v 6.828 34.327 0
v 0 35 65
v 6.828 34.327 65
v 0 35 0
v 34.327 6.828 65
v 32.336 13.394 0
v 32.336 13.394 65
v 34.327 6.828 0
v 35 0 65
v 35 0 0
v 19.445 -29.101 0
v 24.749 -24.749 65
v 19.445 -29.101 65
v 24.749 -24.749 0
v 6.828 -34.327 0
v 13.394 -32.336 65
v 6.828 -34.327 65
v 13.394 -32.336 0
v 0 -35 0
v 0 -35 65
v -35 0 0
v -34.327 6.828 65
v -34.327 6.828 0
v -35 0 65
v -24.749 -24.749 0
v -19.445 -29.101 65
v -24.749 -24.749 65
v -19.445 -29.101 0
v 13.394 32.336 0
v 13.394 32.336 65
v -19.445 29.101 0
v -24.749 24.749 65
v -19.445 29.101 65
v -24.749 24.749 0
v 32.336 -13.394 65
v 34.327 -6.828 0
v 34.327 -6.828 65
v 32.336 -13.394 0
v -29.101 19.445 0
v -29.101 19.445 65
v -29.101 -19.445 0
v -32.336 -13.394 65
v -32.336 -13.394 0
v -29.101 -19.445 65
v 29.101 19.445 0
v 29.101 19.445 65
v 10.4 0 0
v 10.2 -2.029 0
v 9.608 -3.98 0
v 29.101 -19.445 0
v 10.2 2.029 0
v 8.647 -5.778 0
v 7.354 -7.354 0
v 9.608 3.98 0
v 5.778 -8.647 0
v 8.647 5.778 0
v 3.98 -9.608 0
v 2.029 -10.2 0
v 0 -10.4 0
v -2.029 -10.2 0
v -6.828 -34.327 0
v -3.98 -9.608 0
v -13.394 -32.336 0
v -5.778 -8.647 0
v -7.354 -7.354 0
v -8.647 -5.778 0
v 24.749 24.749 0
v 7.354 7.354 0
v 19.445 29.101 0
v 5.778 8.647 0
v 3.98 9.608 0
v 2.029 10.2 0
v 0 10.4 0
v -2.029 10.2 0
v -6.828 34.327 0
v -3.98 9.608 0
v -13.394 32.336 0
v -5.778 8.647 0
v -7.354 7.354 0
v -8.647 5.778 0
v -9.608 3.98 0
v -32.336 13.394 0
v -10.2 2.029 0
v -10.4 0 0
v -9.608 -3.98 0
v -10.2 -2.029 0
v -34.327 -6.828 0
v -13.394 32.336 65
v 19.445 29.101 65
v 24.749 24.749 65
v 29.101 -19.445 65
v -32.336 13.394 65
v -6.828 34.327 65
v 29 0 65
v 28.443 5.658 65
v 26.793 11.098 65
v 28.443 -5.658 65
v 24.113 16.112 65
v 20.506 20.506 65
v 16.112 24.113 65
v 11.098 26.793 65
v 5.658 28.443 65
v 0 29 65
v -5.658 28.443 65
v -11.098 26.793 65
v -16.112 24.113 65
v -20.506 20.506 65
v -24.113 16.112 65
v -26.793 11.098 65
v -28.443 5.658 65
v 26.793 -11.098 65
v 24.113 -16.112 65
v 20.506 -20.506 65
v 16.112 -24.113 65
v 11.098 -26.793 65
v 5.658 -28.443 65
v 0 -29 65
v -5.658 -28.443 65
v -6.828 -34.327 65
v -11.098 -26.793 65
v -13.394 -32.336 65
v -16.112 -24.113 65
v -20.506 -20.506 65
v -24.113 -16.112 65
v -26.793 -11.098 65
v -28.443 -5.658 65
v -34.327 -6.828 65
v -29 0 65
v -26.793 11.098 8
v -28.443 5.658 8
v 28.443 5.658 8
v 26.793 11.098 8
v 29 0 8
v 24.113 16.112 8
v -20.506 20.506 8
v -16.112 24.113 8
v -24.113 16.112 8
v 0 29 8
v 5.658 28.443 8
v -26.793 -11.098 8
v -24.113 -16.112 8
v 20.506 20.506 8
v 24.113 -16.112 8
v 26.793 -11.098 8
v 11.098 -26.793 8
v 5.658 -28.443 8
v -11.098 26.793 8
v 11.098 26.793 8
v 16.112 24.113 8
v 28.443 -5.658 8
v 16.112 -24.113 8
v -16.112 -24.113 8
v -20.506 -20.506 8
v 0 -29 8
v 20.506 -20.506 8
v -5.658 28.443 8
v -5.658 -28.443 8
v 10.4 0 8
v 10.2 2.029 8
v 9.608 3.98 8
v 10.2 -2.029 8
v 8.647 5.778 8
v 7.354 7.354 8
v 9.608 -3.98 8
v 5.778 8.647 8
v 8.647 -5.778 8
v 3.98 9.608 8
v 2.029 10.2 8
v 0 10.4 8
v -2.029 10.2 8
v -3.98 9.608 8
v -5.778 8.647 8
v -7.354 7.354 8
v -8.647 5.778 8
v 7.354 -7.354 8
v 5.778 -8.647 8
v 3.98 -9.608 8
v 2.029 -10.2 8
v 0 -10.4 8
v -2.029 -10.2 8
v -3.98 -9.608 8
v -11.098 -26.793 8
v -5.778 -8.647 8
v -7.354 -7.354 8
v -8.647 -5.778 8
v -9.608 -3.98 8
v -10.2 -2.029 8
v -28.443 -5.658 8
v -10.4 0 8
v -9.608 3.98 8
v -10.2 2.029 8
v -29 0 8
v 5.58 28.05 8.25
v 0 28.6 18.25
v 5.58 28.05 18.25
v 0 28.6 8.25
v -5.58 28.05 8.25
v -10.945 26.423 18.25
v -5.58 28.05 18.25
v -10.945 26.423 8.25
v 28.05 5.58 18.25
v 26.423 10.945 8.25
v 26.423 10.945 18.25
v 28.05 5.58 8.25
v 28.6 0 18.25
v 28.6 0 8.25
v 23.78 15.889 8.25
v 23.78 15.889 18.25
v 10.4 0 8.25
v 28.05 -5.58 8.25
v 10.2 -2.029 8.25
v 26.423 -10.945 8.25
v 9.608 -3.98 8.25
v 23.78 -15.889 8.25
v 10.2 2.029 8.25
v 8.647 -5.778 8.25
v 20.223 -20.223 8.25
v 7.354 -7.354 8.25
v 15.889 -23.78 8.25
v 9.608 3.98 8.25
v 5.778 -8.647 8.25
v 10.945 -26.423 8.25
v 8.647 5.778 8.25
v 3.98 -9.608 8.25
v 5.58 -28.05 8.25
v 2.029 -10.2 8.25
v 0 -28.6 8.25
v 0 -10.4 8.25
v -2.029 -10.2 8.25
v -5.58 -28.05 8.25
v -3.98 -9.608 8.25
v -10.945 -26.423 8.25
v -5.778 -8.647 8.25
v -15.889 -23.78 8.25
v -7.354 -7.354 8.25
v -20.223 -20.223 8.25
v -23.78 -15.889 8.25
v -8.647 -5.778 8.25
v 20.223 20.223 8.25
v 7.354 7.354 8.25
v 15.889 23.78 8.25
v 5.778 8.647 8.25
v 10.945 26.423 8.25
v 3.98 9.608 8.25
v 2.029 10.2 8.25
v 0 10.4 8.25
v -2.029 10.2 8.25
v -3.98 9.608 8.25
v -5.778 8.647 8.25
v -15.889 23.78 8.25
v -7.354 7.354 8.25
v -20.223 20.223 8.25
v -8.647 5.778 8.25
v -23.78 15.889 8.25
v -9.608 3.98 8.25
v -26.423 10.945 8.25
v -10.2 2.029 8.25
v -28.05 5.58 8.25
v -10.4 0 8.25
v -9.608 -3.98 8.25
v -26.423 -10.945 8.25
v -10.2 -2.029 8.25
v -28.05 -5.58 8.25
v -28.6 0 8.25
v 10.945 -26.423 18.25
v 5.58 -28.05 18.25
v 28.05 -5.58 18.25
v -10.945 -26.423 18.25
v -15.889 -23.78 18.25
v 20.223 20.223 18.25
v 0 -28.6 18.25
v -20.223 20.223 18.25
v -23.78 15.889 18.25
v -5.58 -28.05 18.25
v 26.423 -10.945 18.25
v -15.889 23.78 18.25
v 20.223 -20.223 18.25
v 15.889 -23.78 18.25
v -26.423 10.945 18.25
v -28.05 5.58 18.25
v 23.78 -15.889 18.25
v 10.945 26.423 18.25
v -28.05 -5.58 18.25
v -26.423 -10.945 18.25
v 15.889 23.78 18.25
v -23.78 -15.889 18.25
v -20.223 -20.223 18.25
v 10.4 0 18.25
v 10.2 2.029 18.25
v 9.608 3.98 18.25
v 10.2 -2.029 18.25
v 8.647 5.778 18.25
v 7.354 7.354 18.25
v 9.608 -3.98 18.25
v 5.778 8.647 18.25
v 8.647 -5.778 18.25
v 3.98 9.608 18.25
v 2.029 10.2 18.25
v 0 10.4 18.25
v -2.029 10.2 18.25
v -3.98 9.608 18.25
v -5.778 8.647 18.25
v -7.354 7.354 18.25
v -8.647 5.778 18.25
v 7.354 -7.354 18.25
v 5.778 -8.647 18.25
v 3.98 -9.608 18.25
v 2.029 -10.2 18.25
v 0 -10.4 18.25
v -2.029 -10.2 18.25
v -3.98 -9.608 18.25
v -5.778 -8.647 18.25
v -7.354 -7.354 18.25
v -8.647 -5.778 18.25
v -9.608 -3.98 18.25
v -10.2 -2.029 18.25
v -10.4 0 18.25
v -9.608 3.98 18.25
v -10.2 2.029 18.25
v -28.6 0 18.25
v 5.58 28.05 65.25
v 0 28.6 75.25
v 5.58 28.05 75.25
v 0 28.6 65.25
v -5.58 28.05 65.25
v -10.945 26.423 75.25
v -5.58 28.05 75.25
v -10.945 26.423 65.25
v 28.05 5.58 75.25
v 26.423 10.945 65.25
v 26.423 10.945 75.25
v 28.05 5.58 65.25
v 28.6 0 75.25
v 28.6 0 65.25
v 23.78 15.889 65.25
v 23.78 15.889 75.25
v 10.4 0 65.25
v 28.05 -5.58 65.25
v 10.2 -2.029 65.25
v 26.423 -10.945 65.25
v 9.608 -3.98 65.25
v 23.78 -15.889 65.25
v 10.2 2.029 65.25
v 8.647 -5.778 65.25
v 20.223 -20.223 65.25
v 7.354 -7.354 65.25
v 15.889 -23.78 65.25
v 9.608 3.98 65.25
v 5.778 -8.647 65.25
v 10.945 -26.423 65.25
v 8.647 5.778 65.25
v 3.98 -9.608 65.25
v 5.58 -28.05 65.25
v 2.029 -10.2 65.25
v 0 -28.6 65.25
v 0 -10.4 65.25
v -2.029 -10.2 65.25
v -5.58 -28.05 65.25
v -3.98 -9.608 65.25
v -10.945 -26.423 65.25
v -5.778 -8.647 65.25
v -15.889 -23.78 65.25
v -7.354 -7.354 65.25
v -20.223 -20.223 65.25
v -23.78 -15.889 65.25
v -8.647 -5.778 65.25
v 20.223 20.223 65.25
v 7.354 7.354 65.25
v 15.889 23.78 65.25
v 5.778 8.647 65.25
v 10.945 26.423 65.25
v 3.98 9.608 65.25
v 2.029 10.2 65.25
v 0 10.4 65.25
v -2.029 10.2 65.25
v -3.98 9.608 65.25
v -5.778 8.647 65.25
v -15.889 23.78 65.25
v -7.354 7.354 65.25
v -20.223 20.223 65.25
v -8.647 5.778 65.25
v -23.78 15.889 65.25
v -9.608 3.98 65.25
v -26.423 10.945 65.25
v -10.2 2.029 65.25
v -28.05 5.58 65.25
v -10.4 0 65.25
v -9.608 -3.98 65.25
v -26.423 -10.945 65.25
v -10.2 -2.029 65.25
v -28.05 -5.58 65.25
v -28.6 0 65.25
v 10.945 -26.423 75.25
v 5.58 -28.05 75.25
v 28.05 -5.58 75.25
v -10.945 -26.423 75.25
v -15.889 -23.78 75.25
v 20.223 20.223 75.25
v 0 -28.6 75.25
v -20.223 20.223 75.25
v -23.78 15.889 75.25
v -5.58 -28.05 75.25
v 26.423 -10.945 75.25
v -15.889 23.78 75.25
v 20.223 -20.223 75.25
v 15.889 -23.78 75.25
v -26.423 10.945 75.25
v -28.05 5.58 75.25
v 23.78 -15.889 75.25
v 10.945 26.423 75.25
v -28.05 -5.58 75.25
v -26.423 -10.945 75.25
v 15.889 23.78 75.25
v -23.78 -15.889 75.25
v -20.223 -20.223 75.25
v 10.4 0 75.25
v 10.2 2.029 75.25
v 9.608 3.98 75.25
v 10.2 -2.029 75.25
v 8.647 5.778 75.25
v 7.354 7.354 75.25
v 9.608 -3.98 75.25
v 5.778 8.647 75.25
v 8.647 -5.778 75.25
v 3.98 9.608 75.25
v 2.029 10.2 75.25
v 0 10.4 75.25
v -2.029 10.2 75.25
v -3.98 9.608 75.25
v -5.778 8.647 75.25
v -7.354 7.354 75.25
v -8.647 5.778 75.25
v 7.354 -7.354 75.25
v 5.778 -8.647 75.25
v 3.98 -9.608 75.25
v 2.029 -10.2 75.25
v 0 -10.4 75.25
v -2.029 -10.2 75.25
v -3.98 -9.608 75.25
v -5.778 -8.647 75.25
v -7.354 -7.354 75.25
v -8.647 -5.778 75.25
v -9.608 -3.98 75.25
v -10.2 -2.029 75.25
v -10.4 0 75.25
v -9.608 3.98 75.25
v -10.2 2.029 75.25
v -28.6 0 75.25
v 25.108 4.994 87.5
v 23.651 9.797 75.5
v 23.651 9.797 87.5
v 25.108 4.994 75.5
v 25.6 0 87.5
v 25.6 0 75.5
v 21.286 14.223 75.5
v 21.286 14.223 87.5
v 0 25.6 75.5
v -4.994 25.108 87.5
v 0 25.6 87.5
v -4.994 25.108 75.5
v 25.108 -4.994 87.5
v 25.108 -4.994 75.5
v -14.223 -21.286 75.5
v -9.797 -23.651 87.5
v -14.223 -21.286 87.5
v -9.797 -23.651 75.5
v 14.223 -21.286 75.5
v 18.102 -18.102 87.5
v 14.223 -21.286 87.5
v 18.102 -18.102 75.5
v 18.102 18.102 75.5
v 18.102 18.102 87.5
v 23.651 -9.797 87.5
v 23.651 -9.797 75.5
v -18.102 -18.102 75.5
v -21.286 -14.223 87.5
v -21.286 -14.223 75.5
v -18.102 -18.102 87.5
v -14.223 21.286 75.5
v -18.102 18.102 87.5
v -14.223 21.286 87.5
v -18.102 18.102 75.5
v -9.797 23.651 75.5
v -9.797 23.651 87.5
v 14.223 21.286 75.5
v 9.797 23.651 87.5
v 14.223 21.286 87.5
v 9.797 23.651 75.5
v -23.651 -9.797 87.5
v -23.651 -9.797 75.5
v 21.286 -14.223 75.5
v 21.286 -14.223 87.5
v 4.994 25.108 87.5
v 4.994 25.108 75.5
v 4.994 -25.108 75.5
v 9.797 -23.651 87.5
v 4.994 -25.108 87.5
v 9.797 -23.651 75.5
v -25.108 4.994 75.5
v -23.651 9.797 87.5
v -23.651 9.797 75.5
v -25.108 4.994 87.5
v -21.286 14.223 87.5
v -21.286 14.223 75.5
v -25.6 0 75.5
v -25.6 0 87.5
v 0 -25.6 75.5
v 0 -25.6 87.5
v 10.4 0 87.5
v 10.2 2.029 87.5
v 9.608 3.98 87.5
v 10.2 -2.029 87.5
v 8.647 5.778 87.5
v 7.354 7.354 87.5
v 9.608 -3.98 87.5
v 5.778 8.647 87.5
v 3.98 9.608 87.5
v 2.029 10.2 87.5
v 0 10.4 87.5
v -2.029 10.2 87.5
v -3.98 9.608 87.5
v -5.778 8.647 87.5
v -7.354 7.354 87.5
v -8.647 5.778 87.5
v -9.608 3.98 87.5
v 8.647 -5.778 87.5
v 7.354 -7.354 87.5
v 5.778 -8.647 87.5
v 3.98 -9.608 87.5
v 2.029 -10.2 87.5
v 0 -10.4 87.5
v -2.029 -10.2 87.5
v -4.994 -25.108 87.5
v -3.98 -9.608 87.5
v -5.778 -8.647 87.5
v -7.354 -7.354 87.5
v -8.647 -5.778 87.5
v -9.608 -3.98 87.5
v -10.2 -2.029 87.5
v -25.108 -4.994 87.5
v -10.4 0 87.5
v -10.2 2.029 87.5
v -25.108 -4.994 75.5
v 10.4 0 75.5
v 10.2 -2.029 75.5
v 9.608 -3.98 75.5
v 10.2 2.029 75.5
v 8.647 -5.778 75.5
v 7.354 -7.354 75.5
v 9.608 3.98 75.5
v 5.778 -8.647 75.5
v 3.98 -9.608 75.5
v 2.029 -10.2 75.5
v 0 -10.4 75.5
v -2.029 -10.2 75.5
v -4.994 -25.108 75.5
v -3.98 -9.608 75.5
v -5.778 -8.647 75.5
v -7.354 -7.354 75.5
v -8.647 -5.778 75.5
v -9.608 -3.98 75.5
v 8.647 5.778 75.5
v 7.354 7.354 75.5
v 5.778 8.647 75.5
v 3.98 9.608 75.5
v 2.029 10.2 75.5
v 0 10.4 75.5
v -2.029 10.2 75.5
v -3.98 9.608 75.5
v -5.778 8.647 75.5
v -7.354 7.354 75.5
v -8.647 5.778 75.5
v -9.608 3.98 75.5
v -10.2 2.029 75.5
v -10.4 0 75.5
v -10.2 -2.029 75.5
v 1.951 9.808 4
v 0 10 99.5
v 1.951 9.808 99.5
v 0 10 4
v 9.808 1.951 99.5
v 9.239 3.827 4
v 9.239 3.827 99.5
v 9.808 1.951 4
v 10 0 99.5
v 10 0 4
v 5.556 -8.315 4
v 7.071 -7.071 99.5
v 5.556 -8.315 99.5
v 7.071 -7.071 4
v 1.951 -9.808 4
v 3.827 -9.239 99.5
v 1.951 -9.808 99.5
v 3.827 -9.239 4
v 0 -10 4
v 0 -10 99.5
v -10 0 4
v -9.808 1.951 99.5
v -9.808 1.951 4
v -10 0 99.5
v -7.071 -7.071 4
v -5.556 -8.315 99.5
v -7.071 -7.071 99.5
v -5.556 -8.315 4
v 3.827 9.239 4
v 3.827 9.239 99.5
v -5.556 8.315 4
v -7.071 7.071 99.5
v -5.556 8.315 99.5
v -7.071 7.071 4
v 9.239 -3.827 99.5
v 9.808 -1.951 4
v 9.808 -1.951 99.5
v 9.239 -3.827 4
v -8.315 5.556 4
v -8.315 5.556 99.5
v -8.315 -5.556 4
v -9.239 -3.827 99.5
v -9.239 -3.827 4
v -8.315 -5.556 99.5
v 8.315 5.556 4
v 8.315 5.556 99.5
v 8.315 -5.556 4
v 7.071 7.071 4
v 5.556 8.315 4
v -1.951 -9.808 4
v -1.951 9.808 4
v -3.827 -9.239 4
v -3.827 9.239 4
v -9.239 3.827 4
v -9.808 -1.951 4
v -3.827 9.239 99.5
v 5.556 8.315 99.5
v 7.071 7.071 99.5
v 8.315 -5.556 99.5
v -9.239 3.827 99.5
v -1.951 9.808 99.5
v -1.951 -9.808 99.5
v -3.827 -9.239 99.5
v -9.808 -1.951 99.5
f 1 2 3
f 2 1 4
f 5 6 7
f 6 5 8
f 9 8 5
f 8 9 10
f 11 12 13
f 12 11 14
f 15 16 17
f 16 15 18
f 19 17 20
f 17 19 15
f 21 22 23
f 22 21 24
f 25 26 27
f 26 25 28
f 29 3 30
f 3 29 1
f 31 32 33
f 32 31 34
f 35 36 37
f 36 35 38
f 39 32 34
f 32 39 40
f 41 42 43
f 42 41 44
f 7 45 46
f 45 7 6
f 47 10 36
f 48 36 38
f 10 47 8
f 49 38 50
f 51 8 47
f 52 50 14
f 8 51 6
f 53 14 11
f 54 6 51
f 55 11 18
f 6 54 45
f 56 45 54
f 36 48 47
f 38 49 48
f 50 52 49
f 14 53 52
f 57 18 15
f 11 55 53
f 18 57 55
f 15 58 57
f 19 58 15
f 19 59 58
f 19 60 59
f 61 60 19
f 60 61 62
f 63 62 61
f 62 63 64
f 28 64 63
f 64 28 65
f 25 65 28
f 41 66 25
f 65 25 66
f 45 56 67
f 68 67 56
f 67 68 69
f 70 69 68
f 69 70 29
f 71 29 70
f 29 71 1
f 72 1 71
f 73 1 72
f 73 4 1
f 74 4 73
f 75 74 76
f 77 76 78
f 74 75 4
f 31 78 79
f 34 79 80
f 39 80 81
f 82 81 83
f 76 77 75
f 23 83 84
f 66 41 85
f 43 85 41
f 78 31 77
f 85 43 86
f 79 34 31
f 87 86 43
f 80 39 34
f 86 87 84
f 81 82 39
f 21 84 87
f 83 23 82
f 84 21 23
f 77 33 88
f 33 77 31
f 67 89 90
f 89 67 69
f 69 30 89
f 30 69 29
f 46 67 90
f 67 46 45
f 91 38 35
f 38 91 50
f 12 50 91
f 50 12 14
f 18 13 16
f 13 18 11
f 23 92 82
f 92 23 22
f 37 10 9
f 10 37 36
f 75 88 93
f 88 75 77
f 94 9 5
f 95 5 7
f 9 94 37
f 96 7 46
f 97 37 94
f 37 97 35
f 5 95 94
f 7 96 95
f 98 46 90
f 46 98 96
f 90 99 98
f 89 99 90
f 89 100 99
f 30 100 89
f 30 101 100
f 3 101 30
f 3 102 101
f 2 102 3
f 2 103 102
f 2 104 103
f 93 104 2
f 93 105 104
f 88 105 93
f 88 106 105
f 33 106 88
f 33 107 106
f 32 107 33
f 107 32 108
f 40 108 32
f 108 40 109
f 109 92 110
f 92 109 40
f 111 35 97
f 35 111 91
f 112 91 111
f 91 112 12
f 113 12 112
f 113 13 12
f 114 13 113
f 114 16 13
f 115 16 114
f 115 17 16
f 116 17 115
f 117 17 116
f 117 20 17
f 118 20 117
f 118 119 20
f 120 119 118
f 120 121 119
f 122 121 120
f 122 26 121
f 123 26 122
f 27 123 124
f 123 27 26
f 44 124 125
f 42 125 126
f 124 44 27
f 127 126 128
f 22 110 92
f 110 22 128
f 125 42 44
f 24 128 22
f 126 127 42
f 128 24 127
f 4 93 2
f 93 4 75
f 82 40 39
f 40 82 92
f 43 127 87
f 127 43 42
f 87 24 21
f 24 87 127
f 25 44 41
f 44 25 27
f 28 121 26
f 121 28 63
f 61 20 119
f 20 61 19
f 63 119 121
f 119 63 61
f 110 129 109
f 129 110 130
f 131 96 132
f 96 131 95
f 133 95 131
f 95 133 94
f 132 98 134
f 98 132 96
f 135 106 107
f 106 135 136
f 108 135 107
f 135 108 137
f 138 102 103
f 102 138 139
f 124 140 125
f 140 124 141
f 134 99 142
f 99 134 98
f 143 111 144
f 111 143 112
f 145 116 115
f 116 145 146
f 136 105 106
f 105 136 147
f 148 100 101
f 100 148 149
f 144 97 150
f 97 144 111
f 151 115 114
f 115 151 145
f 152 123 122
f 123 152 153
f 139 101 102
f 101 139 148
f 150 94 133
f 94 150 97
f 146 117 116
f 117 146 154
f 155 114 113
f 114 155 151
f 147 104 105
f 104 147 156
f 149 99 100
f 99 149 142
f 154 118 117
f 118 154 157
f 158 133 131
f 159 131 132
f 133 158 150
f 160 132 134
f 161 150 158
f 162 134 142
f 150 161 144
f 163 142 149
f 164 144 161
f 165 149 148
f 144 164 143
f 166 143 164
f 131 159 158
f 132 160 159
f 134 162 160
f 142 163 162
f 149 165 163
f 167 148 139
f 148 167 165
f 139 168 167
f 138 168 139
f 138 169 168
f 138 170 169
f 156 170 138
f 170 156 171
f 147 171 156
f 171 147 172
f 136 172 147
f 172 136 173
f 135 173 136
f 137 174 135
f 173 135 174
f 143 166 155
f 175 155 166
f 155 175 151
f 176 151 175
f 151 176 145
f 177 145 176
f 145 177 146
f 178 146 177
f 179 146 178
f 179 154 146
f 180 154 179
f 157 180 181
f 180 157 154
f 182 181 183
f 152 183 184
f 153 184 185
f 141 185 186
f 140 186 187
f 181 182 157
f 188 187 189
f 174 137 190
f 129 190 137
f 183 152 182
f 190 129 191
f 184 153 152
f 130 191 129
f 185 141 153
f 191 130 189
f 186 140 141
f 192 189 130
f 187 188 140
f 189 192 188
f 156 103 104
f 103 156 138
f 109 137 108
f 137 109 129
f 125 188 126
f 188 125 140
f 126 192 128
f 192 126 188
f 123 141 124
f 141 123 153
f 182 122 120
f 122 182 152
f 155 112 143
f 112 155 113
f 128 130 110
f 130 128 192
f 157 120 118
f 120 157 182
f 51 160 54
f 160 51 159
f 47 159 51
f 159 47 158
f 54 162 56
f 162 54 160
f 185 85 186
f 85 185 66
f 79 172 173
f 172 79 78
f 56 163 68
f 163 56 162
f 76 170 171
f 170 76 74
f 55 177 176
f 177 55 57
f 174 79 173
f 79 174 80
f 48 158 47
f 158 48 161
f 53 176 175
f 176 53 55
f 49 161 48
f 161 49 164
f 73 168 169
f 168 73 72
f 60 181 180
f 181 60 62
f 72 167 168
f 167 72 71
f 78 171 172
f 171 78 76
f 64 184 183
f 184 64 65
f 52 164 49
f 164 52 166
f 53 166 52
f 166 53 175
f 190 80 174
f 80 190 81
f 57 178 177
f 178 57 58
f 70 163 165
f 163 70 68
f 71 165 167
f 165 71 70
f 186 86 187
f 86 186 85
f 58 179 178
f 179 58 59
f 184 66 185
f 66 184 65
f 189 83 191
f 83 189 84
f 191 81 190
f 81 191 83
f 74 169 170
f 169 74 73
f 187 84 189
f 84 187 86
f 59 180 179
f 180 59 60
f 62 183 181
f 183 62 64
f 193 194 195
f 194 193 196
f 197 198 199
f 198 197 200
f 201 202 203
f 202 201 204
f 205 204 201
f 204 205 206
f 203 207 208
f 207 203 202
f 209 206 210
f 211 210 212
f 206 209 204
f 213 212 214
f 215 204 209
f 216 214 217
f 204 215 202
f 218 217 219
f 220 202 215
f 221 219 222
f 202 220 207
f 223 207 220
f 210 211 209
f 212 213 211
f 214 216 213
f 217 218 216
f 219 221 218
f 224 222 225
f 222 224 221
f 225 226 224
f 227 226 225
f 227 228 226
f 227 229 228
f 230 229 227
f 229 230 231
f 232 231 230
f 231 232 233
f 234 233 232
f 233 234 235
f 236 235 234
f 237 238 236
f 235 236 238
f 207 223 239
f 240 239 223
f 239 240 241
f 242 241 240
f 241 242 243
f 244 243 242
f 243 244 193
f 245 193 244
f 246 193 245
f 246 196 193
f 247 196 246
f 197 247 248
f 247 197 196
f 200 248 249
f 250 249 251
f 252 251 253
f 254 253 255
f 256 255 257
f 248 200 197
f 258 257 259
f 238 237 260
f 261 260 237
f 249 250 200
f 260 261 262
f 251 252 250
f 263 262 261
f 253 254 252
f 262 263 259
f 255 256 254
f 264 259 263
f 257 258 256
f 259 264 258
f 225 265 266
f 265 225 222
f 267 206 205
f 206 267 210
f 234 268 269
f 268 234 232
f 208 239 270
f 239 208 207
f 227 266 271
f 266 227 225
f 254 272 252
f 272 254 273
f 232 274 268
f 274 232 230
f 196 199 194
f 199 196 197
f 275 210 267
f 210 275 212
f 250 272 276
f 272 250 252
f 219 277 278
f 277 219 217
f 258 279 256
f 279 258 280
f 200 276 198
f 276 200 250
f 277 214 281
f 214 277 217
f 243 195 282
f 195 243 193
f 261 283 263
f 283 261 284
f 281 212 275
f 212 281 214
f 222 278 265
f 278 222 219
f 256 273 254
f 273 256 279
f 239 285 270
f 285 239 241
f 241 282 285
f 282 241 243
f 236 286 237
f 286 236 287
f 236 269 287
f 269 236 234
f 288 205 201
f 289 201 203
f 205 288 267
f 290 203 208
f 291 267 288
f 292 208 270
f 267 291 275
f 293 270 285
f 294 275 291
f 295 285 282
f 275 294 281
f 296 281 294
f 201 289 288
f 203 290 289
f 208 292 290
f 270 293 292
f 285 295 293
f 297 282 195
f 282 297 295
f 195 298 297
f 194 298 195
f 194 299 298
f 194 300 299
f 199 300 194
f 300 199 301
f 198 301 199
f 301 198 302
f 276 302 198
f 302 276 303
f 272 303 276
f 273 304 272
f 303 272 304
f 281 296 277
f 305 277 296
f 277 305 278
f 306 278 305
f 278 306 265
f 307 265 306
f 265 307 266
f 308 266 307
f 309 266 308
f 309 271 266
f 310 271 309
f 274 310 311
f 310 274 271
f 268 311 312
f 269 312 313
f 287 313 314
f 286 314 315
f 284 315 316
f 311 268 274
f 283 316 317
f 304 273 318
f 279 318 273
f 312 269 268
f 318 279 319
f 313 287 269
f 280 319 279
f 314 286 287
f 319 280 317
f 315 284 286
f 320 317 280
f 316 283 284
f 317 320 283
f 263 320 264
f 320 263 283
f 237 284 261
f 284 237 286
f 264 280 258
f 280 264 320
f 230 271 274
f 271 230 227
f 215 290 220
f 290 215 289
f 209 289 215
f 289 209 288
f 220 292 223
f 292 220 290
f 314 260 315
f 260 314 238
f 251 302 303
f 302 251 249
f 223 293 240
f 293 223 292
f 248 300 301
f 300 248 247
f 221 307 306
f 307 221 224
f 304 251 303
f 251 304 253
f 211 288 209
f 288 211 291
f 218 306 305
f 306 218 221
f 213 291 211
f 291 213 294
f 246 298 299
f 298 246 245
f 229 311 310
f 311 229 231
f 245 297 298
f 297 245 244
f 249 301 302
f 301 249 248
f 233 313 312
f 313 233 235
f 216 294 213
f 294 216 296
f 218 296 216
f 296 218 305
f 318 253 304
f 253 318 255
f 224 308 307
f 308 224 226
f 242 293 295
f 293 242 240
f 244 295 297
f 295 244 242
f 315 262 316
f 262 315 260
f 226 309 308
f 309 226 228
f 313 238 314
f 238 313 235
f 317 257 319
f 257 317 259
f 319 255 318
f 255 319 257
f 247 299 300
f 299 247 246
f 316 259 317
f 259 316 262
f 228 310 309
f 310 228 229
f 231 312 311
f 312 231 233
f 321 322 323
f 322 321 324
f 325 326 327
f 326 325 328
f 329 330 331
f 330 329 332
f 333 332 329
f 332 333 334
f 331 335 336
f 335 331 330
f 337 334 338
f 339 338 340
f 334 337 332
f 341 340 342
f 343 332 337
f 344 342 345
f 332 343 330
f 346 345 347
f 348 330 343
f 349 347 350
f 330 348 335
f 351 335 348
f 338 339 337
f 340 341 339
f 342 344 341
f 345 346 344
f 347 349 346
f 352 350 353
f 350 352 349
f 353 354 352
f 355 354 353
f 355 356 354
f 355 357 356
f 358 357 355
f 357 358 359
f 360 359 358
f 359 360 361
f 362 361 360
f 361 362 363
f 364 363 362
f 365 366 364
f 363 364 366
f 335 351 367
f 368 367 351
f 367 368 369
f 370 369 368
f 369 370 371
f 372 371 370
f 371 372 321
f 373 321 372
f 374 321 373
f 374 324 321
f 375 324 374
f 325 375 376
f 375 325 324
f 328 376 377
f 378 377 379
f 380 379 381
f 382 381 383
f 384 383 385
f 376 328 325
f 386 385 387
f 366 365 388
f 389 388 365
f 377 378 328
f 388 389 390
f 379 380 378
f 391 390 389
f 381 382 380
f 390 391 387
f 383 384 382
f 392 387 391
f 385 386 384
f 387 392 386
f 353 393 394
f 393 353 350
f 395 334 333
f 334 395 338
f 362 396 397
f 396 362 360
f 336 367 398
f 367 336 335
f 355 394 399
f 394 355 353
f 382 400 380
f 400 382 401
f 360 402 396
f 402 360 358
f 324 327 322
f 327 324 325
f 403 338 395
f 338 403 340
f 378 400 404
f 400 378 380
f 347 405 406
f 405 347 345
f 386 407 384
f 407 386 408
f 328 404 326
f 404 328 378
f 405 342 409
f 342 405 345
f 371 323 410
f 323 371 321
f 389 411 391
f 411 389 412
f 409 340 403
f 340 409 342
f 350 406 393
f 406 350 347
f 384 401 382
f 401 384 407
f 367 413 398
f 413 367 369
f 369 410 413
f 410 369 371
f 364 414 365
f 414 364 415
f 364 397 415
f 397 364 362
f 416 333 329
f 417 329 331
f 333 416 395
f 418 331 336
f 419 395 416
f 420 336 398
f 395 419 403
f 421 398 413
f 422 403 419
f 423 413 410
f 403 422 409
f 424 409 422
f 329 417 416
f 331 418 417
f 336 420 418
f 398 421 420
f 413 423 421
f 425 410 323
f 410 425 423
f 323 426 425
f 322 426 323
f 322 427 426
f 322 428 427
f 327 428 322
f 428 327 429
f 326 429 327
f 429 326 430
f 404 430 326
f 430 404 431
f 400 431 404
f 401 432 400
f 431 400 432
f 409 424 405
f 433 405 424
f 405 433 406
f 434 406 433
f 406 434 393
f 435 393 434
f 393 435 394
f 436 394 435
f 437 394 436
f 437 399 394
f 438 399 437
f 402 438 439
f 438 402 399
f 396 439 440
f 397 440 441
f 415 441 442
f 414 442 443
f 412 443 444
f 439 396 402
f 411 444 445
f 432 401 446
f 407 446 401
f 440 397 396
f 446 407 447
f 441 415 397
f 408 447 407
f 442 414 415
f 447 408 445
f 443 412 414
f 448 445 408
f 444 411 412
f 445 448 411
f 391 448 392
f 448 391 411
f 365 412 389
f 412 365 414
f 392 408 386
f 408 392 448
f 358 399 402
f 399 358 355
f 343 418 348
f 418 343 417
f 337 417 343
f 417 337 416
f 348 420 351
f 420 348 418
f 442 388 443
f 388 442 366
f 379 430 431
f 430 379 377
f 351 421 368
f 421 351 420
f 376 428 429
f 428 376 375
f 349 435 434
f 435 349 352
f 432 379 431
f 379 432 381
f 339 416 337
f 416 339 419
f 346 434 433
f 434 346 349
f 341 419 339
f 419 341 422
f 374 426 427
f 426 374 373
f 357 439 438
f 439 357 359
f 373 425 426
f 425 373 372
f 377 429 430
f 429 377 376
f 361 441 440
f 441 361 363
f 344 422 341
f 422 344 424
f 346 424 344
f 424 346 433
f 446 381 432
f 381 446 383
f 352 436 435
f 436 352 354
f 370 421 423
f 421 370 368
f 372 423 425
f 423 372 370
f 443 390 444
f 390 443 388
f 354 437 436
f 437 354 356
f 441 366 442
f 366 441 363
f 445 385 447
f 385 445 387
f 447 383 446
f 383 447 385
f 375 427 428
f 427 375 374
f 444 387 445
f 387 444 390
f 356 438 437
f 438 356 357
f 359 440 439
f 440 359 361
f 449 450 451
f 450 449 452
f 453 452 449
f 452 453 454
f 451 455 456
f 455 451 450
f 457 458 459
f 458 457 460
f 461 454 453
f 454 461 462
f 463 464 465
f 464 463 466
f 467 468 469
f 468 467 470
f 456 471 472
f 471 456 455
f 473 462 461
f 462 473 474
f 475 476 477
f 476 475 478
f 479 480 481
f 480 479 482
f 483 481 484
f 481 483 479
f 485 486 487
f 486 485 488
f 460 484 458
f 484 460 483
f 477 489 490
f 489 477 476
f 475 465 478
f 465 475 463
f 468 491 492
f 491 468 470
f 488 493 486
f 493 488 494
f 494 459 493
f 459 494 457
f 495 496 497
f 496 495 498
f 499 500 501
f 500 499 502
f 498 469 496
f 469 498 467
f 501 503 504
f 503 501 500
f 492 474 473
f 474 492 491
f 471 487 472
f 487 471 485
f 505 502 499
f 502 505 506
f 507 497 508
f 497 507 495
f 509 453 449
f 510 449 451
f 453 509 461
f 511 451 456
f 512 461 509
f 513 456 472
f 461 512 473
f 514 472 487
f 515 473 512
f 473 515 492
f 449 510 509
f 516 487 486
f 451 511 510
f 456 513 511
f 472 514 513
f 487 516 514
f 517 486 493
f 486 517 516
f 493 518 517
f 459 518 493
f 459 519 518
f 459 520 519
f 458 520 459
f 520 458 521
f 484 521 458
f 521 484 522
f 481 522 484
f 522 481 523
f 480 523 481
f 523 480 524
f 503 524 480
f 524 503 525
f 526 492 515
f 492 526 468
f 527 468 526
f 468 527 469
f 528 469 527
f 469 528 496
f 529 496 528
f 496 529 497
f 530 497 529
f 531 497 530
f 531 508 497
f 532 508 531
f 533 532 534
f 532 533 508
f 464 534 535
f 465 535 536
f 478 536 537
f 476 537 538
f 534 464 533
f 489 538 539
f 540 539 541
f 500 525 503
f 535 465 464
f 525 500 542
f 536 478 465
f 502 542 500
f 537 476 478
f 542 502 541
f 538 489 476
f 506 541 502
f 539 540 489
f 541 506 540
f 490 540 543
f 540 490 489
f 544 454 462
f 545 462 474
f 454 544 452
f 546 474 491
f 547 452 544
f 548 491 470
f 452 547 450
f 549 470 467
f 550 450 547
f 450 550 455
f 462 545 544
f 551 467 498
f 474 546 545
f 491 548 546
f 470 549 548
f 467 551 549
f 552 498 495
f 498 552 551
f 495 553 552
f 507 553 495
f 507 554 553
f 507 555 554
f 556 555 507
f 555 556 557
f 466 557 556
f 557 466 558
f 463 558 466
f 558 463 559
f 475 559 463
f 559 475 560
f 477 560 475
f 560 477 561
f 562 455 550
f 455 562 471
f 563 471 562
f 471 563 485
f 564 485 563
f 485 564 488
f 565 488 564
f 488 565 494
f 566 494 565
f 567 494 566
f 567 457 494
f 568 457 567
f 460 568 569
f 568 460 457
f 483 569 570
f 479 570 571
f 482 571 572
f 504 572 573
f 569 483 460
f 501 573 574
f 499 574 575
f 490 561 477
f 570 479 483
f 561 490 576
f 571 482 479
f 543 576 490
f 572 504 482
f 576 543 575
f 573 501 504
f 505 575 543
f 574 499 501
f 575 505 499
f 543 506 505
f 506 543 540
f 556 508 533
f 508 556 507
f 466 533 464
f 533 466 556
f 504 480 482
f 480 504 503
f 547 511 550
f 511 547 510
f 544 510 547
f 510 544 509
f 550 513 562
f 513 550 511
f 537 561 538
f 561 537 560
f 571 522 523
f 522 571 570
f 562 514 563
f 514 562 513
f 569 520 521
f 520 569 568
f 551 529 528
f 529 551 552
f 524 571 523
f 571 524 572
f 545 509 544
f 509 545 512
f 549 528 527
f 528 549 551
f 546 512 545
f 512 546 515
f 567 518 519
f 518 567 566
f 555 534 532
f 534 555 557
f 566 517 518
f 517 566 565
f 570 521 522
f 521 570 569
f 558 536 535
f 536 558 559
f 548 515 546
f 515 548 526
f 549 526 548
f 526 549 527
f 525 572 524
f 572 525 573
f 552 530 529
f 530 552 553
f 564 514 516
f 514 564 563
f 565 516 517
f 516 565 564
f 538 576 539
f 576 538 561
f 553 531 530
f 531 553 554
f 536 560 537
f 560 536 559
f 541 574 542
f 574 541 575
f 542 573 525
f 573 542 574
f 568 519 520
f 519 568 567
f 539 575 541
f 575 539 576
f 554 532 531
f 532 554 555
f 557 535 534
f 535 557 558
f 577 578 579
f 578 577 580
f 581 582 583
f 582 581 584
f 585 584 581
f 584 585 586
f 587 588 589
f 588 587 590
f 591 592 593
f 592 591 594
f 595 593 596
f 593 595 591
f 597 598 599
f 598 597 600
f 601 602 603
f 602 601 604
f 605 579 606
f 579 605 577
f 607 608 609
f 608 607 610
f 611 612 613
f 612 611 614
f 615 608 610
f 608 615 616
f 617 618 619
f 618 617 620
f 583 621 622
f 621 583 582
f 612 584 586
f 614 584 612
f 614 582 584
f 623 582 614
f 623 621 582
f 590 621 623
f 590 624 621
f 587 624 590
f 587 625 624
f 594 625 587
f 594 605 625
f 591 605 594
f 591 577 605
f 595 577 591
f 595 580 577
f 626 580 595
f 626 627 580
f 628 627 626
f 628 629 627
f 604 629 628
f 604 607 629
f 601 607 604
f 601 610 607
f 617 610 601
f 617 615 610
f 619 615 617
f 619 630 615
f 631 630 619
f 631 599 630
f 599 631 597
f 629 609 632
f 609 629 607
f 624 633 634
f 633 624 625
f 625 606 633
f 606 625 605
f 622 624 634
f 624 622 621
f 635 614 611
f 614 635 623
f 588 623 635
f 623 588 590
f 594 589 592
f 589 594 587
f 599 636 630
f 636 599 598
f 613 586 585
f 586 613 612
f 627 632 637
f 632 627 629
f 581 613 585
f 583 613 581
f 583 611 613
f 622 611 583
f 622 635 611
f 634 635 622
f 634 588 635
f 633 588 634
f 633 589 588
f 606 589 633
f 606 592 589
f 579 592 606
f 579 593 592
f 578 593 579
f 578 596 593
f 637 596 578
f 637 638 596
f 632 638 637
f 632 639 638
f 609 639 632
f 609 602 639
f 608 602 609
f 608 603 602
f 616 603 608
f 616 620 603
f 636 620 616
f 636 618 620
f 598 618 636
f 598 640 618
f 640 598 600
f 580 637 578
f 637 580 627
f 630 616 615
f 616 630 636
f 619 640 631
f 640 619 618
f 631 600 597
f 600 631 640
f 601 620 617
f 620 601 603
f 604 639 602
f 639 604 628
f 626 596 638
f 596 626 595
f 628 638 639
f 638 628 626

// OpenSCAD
$fn = 32;

// ------------------------------------------------------------------------
// Bearing housing: housing d70, two bearings and a shaft
// Every part is its own module, assembly() places them once.
// ------------------------------------------------------------------------

// --- part 1 ---
module housing() {
  difference() {
    cylinder(h = 65, d = 70);
    translate([0, 0, 8]) cylinder(h = 58, d = 58);
    translate([0, 0, -1]) cylinder(h = 10, d = 20.8);
  }
}

// --- part 2 ---
module bearing_lower() {
  difference() {
      translate([0, 0, 0]) cylinder(h = 10, d = 57.2);
      translate([0, 0, -1]) cylinder(h = 12, d = 20.8);
    }
}

// --- part 3 ---
module bearing_upper() {
  difference() {
      translate([0, 0, 0]) cylinder(h = 10, d = 57.2);
      translate([0, 0, -1]) cylinder(h = 12, d = 20.8);
    }
}

// --- part 4 ---
module spacer() {
  difference() {
      translate([0, 0, 0]) cylinder(h = 12, d = 51.2);
      translate([0, 0, -1]) cylinder(h = 14, d = 20.8);
    }
}

// --- part 5 ---
module shaft() {
  translate([0, 0, -47.75]) cylinder(h = 95.5, d = 20);
}

// --- assembly ---
module assembly() {
  translate([0, 0, 0]) rotate([0, 0, 0]) housing();
  translate([0, 0, 8.25]) rotate([0, 0, 0]) bearing_lower();
  translate([0, 0, 65.25]) rotate([0, 0, 0]) bearing_upper();
  translate([0, 0, 75.5]) rotate([0, 0, 0]) spacer();
  translate([0, 0, 51.75]) rotate([0, 0, 0]) shaft();
}

assembly();
